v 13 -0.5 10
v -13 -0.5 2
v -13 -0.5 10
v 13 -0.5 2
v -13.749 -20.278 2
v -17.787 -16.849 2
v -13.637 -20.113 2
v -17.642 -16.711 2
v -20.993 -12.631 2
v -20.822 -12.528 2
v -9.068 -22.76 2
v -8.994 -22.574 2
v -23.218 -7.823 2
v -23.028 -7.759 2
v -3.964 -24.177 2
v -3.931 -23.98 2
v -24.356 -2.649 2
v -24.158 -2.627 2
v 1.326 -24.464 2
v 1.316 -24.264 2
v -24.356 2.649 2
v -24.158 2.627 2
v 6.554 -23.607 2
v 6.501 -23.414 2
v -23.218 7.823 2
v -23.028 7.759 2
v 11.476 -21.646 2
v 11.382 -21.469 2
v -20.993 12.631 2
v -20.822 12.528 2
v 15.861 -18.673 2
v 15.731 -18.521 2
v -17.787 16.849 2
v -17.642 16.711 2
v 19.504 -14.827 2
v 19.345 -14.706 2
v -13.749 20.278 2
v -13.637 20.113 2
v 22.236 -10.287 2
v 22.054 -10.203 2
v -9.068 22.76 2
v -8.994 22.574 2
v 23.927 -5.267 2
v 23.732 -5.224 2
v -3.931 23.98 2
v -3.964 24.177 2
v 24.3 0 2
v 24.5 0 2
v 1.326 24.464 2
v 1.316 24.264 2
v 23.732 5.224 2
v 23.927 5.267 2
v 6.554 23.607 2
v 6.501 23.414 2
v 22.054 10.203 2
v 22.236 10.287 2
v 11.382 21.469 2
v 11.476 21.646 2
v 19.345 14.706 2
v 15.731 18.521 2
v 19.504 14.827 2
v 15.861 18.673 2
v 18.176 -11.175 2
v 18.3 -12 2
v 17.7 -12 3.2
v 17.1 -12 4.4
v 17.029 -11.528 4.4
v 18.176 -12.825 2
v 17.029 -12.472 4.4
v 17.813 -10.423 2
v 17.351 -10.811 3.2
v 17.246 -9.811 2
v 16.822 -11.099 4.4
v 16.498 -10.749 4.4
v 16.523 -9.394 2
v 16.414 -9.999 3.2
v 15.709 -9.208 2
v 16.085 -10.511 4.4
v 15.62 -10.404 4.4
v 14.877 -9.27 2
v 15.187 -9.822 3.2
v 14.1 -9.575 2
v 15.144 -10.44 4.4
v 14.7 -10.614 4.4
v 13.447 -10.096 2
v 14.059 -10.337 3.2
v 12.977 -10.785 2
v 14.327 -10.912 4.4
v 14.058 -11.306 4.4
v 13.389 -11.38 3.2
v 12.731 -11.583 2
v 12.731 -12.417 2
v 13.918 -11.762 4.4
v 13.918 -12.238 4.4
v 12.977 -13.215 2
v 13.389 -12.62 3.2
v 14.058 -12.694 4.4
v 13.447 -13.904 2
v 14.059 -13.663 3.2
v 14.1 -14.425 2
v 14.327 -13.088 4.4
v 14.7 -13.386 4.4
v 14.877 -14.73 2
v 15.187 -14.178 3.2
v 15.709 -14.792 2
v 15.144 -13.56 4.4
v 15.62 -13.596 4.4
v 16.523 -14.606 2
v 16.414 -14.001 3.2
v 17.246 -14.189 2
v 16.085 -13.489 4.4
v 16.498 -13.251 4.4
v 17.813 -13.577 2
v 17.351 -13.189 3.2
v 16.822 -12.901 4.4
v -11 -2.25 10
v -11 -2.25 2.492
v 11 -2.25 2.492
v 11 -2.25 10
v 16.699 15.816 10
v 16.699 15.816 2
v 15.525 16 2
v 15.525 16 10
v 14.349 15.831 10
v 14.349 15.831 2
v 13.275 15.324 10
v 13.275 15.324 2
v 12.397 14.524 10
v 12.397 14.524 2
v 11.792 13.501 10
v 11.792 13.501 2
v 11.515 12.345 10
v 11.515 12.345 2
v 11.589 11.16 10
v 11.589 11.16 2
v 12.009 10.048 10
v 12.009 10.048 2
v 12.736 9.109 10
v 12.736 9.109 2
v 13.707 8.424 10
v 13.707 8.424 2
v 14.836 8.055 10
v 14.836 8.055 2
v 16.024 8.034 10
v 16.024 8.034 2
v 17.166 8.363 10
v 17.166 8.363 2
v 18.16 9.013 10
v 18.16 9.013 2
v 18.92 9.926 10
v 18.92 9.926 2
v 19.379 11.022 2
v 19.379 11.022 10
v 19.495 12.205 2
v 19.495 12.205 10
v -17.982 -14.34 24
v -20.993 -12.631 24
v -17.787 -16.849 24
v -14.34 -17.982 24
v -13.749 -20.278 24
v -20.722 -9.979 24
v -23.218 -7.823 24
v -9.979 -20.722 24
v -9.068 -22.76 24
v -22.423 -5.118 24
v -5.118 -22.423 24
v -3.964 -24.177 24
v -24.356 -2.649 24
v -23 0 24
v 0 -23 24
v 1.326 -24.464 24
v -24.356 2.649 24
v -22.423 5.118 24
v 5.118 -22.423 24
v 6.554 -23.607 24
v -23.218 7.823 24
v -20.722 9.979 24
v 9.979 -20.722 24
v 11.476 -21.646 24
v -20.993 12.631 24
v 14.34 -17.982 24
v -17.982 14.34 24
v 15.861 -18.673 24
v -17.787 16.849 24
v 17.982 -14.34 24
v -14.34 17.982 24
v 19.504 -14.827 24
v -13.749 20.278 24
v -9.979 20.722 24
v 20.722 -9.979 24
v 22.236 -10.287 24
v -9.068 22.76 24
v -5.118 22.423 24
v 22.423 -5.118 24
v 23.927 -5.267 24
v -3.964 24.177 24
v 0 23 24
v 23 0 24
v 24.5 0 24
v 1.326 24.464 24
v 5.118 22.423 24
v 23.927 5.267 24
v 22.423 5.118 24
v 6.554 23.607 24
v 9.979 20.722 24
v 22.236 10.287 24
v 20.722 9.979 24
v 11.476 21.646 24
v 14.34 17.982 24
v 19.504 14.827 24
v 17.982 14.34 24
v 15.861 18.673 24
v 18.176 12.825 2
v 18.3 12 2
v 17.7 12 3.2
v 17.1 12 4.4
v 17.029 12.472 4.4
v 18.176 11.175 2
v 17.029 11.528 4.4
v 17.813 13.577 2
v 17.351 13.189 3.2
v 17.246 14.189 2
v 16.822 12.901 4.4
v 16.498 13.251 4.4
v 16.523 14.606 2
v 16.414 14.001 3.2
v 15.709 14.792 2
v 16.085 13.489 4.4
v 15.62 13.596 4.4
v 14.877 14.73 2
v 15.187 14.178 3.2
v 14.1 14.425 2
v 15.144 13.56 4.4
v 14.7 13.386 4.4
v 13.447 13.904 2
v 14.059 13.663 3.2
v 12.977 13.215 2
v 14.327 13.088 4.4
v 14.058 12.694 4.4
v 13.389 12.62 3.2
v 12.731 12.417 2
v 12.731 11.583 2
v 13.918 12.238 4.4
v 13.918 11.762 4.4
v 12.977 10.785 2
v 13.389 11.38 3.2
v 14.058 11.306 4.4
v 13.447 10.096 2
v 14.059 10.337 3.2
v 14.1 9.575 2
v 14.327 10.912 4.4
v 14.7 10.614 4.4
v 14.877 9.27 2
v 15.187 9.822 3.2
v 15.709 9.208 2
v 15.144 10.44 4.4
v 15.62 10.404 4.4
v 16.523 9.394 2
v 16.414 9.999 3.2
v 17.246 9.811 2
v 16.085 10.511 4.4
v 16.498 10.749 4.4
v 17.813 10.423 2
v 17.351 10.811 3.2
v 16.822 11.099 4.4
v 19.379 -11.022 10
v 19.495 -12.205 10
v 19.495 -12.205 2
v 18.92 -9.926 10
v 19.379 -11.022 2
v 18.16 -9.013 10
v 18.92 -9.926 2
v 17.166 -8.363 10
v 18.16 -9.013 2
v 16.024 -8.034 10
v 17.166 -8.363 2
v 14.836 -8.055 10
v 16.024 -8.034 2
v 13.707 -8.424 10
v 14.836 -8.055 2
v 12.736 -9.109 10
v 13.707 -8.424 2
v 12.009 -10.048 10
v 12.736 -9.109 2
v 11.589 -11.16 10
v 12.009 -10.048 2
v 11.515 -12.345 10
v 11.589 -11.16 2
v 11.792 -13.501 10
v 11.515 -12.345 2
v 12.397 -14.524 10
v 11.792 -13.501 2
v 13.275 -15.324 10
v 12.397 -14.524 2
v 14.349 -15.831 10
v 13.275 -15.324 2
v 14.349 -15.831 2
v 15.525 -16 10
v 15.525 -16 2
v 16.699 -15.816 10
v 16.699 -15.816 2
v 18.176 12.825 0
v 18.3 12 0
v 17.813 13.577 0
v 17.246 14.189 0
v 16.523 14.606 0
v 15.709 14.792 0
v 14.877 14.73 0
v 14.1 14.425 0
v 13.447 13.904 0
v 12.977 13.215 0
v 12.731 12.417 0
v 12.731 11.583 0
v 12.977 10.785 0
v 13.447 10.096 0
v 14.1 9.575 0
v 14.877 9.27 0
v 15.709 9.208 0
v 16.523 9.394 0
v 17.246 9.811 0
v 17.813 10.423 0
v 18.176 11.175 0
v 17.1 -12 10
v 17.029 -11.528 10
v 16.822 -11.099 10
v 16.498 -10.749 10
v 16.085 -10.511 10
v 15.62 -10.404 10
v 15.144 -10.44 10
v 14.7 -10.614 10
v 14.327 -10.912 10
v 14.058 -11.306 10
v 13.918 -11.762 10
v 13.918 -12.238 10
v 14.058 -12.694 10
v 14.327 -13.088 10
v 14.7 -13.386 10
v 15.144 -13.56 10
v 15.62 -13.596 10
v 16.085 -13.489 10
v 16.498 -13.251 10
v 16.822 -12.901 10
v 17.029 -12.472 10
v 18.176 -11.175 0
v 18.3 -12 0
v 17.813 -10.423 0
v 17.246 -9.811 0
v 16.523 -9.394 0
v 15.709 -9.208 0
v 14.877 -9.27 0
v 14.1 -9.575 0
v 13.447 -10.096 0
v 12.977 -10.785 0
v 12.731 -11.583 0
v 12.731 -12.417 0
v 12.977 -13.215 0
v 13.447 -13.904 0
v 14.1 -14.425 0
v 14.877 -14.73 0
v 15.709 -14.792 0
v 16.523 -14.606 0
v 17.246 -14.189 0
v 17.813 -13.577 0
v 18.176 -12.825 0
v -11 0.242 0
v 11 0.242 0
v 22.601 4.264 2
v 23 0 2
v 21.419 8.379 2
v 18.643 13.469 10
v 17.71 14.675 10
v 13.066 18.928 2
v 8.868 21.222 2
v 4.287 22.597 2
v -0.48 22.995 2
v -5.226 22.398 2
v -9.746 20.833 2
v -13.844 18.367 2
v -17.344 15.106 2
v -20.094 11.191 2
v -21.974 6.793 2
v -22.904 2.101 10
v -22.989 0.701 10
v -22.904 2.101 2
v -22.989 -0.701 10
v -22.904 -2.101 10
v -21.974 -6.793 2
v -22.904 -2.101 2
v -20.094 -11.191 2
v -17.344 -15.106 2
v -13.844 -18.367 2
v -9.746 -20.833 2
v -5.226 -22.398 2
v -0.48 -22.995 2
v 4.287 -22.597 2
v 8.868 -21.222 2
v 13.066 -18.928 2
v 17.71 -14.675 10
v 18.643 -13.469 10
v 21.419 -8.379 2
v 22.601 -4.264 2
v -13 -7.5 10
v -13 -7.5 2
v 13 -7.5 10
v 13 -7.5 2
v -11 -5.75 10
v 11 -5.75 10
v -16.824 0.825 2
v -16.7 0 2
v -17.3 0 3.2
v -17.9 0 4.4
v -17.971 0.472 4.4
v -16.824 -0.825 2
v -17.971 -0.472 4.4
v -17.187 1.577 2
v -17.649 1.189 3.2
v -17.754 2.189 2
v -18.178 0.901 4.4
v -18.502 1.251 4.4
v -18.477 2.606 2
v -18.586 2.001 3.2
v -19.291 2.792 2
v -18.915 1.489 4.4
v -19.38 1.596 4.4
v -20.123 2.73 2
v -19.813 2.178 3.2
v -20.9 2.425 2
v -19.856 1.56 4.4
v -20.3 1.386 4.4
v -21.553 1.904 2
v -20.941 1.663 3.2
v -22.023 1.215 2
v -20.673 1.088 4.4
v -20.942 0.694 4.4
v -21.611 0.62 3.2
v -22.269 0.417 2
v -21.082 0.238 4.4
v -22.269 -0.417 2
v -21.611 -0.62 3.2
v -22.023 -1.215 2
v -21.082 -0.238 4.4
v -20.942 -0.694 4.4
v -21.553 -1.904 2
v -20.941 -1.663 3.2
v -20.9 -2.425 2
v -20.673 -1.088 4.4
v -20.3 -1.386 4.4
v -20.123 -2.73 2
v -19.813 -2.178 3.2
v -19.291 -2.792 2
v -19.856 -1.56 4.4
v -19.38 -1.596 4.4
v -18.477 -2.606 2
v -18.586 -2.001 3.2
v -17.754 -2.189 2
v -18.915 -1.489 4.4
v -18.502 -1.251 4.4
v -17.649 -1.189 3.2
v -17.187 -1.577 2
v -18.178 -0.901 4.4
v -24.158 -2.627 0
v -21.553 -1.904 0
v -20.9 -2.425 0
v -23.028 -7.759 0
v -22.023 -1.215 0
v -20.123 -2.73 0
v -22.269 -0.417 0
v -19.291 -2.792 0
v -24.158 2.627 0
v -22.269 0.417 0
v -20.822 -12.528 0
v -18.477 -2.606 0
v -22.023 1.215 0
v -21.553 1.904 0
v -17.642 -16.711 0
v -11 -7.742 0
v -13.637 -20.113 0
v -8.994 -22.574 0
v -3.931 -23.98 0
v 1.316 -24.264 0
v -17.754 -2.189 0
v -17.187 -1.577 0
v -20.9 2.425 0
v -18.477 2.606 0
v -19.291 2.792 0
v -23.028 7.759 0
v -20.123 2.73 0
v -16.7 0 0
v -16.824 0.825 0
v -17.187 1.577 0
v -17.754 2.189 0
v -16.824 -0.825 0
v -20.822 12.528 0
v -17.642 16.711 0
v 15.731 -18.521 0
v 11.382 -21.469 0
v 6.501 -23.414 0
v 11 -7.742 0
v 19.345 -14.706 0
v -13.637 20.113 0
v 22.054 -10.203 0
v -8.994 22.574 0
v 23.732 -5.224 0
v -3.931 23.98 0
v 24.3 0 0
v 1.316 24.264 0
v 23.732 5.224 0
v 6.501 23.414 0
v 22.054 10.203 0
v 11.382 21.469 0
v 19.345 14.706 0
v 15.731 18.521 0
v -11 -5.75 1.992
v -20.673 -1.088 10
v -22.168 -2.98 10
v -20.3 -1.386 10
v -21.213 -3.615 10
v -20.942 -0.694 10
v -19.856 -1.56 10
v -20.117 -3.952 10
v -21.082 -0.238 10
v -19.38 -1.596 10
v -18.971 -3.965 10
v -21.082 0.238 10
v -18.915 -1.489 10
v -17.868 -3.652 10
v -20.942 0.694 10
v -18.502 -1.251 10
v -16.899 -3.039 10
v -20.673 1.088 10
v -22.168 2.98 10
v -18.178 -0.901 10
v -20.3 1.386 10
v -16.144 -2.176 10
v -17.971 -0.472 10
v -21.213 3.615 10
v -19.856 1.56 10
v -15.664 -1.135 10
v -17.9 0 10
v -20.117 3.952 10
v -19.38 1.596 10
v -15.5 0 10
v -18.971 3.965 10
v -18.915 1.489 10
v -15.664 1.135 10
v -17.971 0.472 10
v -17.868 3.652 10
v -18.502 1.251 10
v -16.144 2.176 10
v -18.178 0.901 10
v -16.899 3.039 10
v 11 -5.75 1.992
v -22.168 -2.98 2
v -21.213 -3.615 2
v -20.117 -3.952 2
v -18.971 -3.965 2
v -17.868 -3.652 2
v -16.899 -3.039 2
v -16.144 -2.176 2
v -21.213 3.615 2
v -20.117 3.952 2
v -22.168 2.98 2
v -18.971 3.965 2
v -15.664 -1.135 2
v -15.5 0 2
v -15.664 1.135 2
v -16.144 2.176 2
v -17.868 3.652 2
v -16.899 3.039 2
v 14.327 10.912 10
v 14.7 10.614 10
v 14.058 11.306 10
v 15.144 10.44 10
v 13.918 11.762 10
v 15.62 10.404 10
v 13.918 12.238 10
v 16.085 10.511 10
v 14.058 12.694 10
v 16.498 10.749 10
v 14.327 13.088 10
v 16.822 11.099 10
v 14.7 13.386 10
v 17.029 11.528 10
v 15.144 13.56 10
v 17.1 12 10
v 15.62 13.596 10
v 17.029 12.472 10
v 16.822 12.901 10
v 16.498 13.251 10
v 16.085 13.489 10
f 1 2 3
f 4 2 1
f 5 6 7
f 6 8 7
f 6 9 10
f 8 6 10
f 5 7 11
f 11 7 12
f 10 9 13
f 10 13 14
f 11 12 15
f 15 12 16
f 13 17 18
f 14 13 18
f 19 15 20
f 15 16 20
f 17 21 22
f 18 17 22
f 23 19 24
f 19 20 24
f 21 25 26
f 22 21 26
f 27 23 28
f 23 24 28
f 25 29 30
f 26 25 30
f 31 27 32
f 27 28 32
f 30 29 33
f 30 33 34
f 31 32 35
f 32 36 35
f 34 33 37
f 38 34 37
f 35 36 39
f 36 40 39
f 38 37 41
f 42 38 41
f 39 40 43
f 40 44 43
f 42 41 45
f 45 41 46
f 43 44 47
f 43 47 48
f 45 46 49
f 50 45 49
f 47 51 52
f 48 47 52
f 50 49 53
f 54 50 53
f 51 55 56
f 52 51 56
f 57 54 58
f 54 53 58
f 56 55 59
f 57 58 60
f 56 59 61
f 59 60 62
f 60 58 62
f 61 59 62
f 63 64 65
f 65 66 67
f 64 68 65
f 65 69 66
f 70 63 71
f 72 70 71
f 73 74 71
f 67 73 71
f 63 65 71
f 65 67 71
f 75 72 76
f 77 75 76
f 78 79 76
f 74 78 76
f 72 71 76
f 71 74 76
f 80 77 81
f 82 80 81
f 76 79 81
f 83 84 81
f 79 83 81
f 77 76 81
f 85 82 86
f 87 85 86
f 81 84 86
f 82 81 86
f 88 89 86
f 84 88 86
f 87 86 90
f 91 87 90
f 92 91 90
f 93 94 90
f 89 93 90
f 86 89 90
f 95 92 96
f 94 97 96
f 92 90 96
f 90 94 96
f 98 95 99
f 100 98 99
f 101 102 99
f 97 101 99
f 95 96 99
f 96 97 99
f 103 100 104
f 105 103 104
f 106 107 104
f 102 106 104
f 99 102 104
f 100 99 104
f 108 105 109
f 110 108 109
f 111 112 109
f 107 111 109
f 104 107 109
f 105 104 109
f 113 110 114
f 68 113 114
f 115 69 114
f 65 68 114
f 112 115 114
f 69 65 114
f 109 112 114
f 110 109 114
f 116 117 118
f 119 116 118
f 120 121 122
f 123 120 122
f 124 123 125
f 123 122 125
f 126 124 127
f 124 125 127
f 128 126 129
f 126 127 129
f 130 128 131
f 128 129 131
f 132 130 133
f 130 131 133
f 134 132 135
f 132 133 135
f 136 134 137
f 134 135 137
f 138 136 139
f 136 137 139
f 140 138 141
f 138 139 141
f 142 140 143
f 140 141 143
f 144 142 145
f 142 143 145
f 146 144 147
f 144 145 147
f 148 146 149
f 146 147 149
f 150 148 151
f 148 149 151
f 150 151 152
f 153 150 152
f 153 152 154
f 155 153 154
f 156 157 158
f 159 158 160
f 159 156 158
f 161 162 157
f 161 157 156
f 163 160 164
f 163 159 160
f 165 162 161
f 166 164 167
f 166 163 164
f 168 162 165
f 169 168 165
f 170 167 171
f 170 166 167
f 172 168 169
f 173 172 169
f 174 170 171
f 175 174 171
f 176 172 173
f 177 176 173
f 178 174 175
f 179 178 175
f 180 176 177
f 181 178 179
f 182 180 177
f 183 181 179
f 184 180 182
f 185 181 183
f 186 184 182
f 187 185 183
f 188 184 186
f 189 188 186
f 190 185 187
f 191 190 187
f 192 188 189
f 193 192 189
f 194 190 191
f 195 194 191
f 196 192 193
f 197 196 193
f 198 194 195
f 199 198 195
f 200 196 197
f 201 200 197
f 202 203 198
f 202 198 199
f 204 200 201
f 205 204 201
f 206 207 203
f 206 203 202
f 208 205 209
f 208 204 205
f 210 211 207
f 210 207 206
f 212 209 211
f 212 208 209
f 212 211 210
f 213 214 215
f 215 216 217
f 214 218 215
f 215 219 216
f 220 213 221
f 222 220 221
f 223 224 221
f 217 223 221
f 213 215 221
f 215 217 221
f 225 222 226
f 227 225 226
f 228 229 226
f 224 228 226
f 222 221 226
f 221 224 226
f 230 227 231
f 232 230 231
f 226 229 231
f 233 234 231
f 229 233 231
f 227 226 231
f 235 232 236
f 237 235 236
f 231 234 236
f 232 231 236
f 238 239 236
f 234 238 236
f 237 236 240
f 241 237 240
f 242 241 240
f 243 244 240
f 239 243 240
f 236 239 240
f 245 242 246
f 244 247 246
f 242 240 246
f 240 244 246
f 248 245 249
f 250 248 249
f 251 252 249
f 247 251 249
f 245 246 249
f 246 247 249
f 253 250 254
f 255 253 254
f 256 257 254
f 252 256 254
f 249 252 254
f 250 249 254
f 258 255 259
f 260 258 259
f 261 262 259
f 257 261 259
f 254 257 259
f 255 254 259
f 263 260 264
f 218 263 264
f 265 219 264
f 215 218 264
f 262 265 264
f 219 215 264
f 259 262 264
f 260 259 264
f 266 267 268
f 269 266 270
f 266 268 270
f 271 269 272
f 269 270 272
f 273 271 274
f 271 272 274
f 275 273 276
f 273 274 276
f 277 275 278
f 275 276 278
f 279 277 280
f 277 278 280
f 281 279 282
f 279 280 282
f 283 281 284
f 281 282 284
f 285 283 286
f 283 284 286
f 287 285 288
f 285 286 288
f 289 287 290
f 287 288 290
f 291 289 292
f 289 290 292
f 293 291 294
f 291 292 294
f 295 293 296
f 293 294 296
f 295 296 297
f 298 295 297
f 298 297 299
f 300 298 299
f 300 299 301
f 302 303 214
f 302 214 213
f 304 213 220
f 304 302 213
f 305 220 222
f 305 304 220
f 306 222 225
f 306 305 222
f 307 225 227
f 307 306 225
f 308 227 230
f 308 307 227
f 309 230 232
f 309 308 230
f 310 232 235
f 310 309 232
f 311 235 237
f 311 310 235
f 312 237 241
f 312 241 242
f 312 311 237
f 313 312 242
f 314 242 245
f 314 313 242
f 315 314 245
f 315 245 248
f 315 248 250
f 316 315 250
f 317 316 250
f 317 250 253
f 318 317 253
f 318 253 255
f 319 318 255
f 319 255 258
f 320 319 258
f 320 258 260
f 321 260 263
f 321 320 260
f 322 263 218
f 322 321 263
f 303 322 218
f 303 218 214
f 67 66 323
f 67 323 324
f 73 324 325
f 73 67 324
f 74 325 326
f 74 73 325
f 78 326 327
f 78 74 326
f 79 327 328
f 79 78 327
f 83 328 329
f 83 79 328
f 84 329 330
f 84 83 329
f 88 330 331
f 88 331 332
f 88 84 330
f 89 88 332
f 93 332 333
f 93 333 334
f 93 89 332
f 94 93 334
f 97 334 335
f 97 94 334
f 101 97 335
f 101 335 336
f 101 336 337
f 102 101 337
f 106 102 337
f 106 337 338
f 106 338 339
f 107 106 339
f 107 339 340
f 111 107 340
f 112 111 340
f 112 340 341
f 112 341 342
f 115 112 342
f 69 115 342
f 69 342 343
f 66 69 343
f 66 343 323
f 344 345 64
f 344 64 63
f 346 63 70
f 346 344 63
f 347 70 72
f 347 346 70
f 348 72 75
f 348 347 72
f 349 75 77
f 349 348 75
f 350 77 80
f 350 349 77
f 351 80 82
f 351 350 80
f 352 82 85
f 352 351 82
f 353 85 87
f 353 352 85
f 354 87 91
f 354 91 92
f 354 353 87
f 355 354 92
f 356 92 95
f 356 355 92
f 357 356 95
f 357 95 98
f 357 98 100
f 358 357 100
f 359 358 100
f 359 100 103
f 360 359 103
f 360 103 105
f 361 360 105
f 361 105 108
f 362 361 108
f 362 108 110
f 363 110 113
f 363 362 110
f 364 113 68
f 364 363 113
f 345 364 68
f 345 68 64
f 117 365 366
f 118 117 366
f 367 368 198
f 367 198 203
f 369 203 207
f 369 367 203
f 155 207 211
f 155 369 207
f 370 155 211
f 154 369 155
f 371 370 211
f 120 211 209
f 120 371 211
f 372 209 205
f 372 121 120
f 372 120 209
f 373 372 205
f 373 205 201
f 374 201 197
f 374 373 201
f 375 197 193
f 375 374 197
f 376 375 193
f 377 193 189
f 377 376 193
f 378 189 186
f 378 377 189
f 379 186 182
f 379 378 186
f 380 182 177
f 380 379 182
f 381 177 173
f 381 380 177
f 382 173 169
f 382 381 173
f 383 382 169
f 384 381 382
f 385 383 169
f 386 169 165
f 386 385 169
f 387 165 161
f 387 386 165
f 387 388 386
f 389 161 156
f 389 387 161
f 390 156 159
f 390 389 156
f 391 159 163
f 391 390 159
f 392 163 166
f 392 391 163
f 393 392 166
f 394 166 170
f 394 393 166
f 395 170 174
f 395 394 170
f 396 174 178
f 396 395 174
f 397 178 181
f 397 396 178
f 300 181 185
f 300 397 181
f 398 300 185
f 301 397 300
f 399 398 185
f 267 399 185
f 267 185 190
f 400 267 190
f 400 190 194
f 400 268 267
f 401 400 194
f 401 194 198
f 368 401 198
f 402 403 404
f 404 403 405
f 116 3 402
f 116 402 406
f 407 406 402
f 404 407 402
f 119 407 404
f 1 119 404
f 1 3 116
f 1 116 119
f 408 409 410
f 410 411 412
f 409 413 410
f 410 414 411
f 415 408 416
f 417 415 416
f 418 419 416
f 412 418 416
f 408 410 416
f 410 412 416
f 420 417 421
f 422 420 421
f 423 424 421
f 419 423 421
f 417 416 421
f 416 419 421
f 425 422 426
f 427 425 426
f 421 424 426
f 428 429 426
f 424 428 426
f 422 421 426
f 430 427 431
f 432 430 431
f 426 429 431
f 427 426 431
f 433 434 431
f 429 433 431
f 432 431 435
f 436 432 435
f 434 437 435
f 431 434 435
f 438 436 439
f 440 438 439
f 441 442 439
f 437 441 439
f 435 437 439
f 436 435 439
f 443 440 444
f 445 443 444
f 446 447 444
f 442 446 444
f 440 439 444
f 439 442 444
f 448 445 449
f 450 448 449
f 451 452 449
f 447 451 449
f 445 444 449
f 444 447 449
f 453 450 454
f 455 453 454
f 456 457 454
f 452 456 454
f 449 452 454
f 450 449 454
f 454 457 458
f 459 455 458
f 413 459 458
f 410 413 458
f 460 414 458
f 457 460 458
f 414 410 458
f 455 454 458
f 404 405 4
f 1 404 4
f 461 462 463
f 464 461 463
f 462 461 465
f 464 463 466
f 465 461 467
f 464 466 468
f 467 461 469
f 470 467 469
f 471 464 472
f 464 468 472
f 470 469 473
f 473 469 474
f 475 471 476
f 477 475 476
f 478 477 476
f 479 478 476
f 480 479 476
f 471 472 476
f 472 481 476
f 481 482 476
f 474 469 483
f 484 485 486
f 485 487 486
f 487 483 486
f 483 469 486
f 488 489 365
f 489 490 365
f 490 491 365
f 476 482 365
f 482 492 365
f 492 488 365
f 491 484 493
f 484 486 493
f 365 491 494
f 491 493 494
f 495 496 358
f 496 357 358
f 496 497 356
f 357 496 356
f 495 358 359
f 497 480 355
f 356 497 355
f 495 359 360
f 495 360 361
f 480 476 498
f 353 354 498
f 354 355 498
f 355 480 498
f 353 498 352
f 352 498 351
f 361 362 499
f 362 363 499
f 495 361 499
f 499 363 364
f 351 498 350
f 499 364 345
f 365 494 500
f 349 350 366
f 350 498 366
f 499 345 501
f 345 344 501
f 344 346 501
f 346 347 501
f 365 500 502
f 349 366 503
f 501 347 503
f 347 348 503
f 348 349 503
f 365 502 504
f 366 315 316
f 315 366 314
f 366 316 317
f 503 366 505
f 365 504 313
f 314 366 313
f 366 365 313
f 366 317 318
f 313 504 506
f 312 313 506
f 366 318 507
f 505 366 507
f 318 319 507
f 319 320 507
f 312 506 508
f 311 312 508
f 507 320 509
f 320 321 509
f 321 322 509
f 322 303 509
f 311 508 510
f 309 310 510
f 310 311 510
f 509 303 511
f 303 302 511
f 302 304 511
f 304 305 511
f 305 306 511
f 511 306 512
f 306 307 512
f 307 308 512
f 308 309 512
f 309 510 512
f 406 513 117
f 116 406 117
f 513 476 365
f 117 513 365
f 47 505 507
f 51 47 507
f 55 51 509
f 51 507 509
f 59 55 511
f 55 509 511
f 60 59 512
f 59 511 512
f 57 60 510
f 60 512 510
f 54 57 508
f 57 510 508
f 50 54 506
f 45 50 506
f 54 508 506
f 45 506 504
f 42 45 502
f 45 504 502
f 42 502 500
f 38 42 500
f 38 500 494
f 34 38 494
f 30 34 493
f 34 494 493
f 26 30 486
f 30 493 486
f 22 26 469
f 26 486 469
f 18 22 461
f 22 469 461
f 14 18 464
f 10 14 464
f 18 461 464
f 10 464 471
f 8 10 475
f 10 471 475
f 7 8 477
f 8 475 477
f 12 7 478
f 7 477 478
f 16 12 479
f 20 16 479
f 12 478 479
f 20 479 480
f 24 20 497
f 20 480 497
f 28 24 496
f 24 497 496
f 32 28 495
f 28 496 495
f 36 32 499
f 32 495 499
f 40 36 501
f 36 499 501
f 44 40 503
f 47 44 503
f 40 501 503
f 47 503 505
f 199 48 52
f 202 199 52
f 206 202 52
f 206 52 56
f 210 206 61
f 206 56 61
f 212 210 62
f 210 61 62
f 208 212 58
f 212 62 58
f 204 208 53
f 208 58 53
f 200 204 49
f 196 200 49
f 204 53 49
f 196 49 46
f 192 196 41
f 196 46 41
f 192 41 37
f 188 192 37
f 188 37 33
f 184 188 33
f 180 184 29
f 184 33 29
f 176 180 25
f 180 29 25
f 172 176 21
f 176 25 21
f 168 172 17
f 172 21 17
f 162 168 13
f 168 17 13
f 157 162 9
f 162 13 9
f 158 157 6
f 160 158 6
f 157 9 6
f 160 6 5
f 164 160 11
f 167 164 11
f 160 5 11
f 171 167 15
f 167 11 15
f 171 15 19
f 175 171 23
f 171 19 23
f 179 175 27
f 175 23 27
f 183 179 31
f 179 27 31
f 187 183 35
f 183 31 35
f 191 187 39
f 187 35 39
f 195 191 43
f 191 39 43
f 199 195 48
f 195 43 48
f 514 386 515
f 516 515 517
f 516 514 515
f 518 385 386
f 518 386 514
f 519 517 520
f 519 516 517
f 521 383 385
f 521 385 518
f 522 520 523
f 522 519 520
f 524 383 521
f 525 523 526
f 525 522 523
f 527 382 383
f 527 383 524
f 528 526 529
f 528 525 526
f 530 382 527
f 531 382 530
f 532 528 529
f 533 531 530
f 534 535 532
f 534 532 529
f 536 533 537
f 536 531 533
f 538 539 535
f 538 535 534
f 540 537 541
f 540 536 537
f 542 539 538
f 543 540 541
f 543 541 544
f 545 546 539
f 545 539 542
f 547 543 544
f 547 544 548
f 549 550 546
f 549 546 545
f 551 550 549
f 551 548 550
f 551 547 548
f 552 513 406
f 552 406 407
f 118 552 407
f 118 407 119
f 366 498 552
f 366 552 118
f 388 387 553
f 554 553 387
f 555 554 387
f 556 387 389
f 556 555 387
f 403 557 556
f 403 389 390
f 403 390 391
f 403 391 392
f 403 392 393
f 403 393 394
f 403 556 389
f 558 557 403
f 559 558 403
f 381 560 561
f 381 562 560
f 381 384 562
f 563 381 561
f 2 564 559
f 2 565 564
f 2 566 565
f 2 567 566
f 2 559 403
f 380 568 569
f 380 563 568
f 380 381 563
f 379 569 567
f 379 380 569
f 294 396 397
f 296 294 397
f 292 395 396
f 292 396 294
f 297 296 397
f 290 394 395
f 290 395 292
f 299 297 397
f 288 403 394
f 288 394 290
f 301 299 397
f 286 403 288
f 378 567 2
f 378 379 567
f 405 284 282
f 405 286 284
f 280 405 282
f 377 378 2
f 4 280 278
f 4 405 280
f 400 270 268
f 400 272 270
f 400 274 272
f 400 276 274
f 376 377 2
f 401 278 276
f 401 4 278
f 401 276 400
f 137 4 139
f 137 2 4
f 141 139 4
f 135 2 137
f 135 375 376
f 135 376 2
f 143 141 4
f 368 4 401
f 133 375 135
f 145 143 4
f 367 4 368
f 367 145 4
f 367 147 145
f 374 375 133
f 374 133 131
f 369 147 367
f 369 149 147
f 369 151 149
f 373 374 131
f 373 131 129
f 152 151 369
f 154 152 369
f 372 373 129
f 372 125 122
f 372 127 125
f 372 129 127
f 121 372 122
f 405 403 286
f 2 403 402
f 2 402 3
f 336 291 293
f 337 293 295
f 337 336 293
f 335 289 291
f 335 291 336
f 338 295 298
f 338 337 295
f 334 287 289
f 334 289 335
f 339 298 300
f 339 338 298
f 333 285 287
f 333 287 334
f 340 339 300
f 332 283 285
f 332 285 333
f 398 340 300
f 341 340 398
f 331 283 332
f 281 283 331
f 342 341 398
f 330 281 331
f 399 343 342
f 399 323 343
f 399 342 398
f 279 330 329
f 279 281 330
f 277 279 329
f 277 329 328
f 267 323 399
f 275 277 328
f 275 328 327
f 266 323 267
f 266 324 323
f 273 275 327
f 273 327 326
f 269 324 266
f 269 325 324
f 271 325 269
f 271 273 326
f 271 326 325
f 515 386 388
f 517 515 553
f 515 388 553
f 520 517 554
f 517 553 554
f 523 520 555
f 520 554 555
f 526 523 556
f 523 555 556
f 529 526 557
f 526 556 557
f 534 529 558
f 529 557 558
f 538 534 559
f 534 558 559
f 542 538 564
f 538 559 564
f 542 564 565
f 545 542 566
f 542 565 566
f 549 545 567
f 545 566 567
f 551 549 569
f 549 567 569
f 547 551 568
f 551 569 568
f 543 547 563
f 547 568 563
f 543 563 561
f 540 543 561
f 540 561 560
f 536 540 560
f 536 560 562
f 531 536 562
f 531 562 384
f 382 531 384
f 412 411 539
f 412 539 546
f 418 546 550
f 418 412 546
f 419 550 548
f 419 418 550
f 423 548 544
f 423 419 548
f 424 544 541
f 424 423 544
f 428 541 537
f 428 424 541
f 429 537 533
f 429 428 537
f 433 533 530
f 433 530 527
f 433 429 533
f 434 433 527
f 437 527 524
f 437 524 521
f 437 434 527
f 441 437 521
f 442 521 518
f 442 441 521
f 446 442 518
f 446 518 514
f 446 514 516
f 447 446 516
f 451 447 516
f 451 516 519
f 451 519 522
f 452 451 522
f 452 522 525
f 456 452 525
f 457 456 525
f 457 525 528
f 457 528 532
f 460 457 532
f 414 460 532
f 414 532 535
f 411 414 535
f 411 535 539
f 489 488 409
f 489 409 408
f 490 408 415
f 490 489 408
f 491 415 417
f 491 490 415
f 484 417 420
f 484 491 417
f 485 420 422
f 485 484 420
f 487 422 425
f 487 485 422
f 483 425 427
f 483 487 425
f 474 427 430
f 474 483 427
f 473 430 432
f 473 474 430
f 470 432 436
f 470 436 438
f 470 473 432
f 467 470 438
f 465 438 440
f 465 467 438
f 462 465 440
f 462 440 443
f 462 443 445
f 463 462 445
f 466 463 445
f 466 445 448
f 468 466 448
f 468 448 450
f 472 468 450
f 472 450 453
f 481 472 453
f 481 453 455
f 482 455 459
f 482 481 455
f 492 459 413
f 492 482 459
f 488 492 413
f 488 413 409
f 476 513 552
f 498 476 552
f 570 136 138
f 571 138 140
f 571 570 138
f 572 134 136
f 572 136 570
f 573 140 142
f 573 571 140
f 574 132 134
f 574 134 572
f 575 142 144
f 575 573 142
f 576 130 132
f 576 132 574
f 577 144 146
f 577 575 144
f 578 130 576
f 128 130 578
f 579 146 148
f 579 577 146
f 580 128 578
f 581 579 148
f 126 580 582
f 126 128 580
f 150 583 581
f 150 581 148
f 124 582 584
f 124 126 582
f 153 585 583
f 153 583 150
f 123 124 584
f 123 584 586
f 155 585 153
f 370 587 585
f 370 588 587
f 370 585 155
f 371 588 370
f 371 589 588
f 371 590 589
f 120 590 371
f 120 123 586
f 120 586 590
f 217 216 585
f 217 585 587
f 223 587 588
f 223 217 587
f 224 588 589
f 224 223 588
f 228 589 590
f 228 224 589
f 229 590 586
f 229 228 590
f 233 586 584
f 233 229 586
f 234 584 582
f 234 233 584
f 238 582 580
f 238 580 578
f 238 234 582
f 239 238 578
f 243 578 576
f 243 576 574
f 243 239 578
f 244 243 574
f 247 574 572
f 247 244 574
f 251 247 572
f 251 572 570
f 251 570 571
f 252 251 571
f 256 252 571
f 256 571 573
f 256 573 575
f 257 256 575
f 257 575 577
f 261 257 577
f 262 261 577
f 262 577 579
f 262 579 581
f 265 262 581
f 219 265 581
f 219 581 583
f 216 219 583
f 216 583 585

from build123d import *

# Parameters (mm, degrees)
BOX002_W               = 22
BOX002_H               = 10
BOX002_DEPTH           = 10
BOX002_PLACEMENT_ANGLE = 45
CYLINDER010_R          = 1.6
CYLINDER010_DEPTH      = 10
CYLINDER009_R          = 2.8
CYLINDER009_DEPTH      = 2
CYLINDER008_R          = 4
CYLINDER008_DEPTH      = 8
CYLINDER007_R          = 1.6
CYLINDER007_DEPTH      = 10
CYLINDER006_R          = 2.8
CYLINDER006_DEPTH      = 2
CYLINDER005_R          = 4
CYLINDER005_DEPTH      = 8
CYLINDER004_R          = 1.6
CYLINDER004_DEPTH      = 10
CYLINDER003_R          = 2.8
CYLINDER003_DEPTH      = 2
CYLINDER001_R          = 4
CYLINDER001_DEPTH      = 8
BOX001_W               = 22
BOX001_H               = 3.5
BOX001_DEPTH           = 15
BOX_W                  = 26
BOX_H                  = 7
BOX_DEPTH              = 8
TUBE_R                 = 24.5
TUBE_R_2               = 23
TUBE_DEPTH             = 22
CYLINDER_R             = 24.3
CYLINDER_DEPTH         = 2


with BuildPart() as box002:
    # Box002 → Box002 (new body)
    with BuildSketch(Plane.XY):
        with Locations((11, 5)):
            Rectangle(BOX002_W, BOX002_H)
    extrude(amount=BOX002_DEPTH)


with BuildPart() as box002_1:
    # Box002 placement: moved
    add(box002.part.moved(Location((-11, -3.75, -10.15))).rotate(Axis((-11, -3.75, -10.15), (1, 0, 0)), BOX002_PLACEMENT_ANGLE))


with BuildPart() as cylinder010:
    # Cylinder010 → Cylinder010 (new body)
    with BuildSketch(Plane(origin=(15.5, -12, 0), x_dir=(1, 0, 0), z_dir=(0, 0, 1))):
        Circle(CYLINDER010_R)
    extrude(amount=CYLINDER010_DEPTH)


with BuildPart() as cone002:
    # Cone002 → Cone002 (revolve)
    with BuildSketch(Plane(origin=(15.5, -12, 2), x_dir=(1, 0, 0), z_dir=(0, -1, 0))):
        Polygon((0, 0), (2.8, 0), (0, 5.6), align=None)
    revolve(axis=Axis((15.5, -12, 2), (0, 0, 1)))


with BuildPart() as cylinder009:
    # Cylinder009 → Cylinder009 (new body)
    with BuildSketch(Plane(origin=(15.5, -12, 0), x_dir=(1, 0, 0), z_dir=(0, 0, 1))):
        Circle(CYLINDER009_R)
    extrude(amount=CYLINDER009_DEPTH)


with BuildPart() as cylinder008:
    # Cylinder008 → Cylinder008 (new body)
    with BuildSketch(Plane(origin=(15.5, -12, 2), x_dir=(1, 0, 0), z_dir=(0, 0, 1))):
        Circle(CYLINDER008_R)
    extrude(amount=CYLINDER008_DEPTH)


with BuildPart() as cylinder007:
    # Cylinder007 → Cylinder007 (new body)
    with BuildSketch(Plane(origin=(15.5, 12, 0), x_dir=(1, 0, 0), z_dir=(0, 0, 1))):
        Circle(CYLINDER007_R)
    extrude(amount=CYLINDER007_DEPTH)


with BuildPart() as cone001:
    # Cone001 → Cone001 (revolve)
    with BuildSketch(Plane(origin=(15.5, 12, 2), x_dir=(1, 0, 0), z_dir=(0, -1, 0))):
        Polygon((0, 0), (2.8, 0), (0, 5.6), align=None)
    revolve(axis=Axis((15.5, 12, 2), (0, 0, 1)))


with BuildPart() as cylinder006:
    # Cylinder006 → Cylinder006 (new body)
    with BuildSketch(Plane(origin=(15.5, 12, 0), x_dir=(1, 0, 0), z_dir=(0, 0, 1))):
        Circle(CYLINDER006_R)
    extrude(amount=CYLINDER006_DEPTH)


with BuildPart() as cylinder005:
    # Cylinder005 → Cylinder005 (new body)
    with BuildSketch(Plane(origin=(15.5, 12, 2), x_dir=(1, 0, 0), z_dir=(0, 0, 1))):
        Circle(CYLINDER005_R)
    extrude(amount=CYLINDER005_DEPTH)


with BuildPart() as cylinder004:
    # Cylinder004 → Cylinder004 (new body)
    with BuildSketch(Plane(origin=(-19.5, 0, 0), x_dir=(1, 0, 0), z_dir=(0, 0, 1))):
        Circle(CYLINDER004_R)
    extrude(amount=CYLINDER004_DEPTH)


with BuildPart() as cone:
    # Cone → Cone (revolve)
    with BuildSketch(Plane(origin=(-19.5, 0, 2), x_dir=(1, 0, 0), z_dir=(0, -1, 0))):
        Polygon((0, 0), (2.8, 0), (0, 5.6), align=None)
    revolve(axis=Axis((-19.5, 0, 2), (0, 0, 1)))


with BuildPart() as cylinder003:
    # Cylinder003 → Cylinder003 (new body)
    with BuildSketch(Plane(origin=(-19.5, 0, 0), x_dir=(1, 0, 0), z_dir=(0, 0, 1))):
        Circle(CYLINDER003_R)
    extrude(amount=CYLINDER003_DEPTH)


with BuildPart() as cylinder001:
    # Cylinder001 → Cylinder001 (new body)
    with BuildSketch(Plane(origin=(-19.5, 0, 2), x_dir=(1, 0, 0), z_dir=(0, 0, 1))):
        Circle(CYLINDER001_R)
    extrude(amount=CYLINDER001_DEPTH)


with BuildPart() as box001:
    # Box001 → Box001 (new body)
    with BuildSketch(Plane(origin=(-11, -5.75, -1), x_dir=(1, 0, 0), z_dir=(0, 0, 1))):
        with Locations((11, 1.75)):
            Rectangle(BOX001_W, BOX001_H)
    extrude(amount=BOX001_DEPTH)


with BuildPart() as box:
    # Box → Box (new body)
    with BuildSketch(Plane(origin=(-13, -7.5, 2), x_dir=(1, 0, 0), z_dir=(0, 0, 1))):
        with Locations((13, 3.5)):
            Rectangle(BOX_W, BOX_H)
    extrude(amount=BOX_DEPTH)


with BuildPart() as tube:
    # Tube → Tube (new body)
    with BuildSketch(Plane.XY.offset(2)):
        Circle(TUBE_R)
        Circle(TUBE_R_2, mode=Mode.SUBTRACT)
    extrude(amount=TUBE_DEPTH)


with BuildPart() as cut010:
    # Cylinder → Cylinder (new body)
    with BuildSketch(Plane.XY):
        Circle(CYLINDER_R)
    extrude(amount=CYLINDER_DEPTH)

    # Fusion: union Tube
    add(tube.part)

    # Fusion001: union Box
    add(box.part)

    # Cut: cut Box001
    add(box001.part, mode=Mode.SUBTRACT)

    # Fusion002: union Cylinder001
    add(cylinder001.part)

    # Cut001: cut Cylinder003
    add(cylinder003.part, mode=Mode.SUBTRACT)

    # Cut002: cut Cone
    add(cone.part, mode=Mode.SUBTRACT)

    # Cut003: cut Cylinder004
    add(cylinder004.part, mode=Mode.SUBTRACT)

    # Fusion003: union Cylinder005
    add(cylinder005.part)

    # Cut004: cut Cylinder006
    add(cylinder006.part, mode=Mode.SUBTRACT)

    # Cut005: cut Cone001
    add(cone001.part, mode=Mode.SUBTRACT)

    # Cut006: cut Cylinder007
    add(cylinder007.part, mode=Mode.SUBTRACT)

    # Fusion004: union Cylinder008
    add(cylinder008.part)

    # Cut007: cut Cylinder009
    add(cylinder009.part, mode=Mode.SUBTRACT)

    # Cut008: cut Cone002
    add(cone002.part, mode=Mode.SUBTRACT)

    # Cut009: cut Cylinder010
    add(cylinder010.part, mode=Mode.SUBTRACT)

    # Cut010: cut Box002
    add(box002_1.part, mode=Mode.SUBTRACT)


solid = cut010.part
